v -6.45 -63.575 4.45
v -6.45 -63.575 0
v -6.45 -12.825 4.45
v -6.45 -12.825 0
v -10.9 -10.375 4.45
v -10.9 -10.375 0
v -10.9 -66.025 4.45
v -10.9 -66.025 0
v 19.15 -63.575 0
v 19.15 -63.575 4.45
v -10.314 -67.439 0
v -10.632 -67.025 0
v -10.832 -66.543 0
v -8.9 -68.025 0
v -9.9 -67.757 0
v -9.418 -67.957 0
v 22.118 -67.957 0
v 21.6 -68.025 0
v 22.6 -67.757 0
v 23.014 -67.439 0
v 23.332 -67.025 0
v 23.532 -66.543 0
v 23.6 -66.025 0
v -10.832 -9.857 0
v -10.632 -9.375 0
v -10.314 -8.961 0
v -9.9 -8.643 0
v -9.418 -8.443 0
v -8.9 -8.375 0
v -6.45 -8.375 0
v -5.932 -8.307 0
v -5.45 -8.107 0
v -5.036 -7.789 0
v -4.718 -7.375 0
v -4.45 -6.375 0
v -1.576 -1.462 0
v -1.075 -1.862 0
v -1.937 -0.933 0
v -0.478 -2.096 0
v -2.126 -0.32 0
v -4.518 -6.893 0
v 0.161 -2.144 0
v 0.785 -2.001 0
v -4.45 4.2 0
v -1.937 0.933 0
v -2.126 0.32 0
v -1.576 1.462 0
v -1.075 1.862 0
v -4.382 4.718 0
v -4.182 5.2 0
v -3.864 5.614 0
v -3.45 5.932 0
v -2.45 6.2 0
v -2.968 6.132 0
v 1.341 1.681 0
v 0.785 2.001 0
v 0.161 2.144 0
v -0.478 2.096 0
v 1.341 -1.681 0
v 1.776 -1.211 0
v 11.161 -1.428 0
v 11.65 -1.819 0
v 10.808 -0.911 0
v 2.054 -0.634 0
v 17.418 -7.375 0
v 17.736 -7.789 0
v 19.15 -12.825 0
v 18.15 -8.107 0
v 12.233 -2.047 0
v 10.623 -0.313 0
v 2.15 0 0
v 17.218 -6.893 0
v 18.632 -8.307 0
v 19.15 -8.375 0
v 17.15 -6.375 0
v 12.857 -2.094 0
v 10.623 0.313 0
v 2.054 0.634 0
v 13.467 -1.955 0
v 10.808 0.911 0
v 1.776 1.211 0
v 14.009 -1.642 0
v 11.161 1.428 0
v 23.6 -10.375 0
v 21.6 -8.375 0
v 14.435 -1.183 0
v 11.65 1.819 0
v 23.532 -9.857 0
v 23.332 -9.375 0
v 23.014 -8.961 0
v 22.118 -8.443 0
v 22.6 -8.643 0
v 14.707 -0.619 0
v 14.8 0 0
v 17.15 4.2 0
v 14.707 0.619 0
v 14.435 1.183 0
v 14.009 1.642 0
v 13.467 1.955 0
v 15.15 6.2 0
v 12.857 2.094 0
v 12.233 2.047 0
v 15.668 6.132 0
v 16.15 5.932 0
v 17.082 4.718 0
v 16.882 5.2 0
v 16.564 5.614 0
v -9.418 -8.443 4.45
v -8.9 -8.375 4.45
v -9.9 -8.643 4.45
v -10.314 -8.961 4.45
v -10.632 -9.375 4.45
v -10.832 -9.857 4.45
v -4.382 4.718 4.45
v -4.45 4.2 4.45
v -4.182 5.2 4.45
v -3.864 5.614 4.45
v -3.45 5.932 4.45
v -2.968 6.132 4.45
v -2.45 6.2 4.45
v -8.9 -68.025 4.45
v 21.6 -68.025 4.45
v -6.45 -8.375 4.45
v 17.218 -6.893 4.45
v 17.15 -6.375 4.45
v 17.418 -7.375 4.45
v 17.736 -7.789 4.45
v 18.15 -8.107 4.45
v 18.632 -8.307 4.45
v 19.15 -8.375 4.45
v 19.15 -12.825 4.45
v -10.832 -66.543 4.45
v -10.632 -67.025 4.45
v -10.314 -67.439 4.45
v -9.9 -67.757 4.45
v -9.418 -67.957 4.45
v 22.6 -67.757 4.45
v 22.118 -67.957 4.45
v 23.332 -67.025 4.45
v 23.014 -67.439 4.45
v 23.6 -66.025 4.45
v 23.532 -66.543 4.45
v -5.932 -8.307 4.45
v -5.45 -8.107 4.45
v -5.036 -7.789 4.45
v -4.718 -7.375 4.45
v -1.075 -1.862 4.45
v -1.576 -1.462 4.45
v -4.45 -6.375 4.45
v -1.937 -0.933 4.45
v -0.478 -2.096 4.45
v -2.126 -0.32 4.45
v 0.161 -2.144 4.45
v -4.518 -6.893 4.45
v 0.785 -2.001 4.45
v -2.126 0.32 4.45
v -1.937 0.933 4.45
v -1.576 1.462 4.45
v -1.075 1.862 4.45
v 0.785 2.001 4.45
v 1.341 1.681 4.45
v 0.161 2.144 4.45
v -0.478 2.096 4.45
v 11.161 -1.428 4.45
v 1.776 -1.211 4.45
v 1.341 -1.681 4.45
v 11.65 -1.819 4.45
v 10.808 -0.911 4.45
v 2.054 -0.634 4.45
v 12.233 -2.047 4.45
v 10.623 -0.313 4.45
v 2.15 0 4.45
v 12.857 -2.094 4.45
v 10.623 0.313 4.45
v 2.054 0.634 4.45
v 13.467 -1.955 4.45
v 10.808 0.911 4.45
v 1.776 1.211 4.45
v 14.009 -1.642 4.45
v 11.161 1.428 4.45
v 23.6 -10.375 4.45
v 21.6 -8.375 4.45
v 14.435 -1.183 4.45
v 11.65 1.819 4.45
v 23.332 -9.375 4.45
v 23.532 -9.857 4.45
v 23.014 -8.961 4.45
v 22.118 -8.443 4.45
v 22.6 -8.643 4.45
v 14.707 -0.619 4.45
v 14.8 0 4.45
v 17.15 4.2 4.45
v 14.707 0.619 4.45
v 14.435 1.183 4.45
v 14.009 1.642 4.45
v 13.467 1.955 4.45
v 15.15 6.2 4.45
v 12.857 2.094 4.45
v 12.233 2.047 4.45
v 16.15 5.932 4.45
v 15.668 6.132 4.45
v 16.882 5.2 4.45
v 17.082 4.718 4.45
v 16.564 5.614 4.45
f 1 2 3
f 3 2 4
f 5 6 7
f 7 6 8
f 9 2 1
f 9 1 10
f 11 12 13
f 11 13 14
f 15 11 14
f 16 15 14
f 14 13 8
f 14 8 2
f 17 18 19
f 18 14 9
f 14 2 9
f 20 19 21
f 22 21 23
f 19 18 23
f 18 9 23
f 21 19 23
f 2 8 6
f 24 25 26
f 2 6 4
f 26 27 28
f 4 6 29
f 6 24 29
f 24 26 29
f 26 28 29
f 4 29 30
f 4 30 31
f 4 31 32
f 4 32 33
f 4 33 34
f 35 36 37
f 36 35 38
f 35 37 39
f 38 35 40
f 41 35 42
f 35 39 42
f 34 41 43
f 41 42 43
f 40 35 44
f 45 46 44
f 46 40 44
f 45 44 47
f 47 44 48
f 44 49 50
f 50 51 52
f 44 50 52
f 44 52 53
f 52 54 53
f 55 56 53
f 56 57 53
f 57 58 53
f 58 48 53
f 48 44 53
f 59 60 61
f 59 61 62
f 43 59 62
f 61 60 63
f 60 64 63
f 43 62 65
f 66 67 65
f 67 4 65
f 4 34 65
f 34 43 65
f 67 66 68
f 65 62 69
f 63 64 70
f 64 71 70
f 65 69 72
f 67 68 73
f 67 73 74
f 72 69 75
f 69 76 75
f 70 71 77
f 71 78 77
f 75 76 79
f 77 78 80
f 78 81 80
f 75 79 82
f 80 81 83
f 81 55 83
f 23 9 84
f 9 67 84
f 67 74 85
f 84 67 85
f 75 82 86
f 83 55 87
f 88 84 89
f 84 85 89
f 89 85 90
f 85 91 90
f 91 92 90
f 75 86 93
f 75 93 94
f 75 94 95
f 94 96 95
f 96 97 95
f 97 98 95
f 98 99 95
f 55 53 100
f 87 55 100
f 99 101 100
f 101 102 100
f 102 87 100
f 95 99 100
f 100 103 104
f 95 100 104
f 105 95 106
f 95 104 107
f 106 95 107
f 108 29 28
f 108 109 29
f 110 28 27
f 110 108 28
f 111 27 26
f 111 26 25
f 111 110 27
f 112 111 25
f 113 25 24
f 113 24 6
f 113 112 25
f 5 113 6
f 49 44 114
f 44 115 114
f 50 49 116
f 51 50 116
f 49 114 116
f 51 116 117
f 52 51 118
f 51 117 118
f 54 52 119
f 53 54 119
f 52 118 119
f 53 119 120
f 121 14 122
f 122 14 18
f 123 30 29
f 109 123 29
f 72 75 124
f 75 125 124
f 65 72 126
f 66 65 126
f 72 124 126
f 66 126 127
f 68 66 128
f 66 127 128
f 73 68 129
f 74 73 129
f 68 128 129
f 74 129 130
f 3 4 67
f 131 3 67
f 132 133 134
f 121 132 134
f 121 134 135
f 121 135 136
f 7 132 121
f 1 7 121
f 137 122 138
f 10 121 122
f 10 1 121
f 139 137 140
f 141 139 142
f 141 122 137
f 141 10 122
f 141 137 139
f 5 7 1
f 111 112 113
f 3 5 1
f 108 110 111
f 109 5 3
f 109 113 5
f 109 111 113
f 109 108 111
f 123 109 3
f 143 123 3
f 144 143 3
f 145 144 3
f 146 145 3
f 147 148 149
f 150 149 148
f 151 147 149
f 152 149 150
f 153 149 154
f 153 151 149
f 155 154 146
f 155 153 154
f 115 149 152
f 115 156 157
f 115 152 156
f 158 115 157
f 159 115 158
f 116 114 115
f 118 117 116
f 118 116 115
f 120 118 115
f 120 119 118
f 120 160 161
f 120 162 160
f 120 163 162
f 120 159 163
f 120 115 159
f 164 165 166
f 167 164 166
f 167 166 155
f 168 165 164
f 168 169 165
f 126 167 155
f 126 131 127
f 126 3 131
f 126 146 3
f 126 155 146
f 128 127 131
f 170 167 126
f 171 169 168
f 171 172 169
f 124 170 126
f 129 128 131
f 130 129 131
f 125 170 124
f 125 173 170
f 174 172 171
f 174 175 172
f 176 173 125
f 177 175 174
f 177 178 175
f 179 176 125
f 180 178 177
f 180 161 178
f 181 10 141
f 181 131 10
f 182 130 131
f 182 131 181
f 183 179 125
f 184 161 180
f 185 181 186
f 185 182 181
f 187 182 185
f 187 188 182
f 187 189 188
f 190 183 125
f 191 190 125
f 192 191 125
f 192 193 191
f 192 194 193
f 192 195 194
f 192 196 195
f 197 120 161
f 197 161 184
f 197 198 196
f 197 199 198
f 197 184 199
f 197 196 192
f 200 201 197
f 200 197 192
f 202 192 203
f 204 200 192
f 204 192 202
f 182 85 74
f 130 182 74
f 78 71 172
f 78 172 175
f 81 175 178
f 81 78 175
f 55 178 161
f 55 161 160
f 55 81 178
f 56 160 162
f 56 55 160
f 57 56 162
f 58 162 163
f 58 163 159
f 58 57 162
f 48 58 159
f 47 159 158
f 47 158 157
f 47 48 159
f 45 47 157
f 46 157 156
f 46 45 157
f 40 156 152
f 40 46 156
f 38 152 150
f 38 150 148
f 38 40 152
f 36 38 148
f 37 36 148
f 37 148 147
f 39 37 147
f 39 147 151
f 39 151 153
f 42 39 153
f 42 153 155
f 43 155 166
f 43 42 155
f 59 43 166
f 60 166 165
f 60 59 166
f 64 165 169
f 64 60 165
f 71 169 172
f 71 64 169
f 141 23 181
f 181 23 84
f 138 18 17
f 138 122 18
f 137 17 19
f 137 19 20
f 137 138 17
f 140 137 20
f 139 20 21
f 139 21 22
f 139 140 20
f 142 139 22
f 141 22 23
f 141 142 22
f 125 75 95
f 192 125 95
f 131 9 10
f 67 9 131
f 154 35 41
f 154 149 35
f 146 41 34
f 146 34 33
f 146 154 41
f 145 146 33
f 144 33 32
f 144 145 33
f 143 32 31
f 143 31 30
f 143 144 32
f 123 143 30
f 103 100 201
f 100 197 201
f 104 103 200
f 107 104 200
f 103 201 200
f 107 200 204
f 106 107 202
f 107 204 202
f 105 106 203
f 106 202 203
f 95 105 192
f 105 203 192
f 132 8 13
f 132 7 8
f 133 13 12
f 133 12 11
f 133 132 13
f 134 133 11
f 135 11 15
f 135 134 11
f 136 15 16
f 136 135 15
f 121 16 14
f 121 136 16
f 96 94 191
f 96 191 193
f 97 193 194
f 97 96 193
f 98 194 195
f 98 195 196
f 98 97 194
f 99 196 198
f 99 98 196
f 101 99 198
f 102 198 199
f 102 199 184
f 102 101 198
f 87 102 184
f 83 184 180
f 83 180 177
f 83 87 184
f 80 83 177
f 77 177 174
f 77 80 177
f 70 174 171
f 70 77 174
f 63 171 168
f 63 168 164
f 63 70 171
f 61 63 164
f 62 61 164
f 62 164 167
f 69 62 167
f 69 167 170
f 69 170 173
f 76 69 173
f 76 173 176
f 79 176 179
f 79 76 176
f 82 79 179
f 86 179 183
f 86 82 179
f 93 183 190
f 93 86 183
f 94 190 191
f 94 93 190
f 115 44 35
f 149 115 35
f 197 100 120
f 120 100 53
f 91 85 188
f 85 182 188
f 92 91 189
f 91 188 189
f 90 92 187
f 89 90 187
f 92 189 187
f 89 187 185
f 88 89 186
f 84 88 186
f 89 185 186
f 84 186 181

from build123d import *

# Parameters (mm, degrees)
SKETCH3_W           = 25.6
SKETCH3_H           = 50.75
SKETCH3_R           = 2.15
SKETCH3_R_2         = 2.1
BOSS_EXTRUDE1_DEPTH = 4.45
FILLET1_R           = 2


with BuildPart() as part:
    # Sketch3 → Boss-Extrude1 (new body)
    with BuildSketch(Plane.XY):
        Polygon((-4.45, -8.375), (-10.9, -8.375), (-10.9, -68.025), (23.6, -68.025), (23.6, -8.375), (17.15, -8.375), (17.15, 6.2), (-4.45, 6.2), align=None)
        with Locations((6.35, -38.2)):
            Rectangle(SKETCH3_W, SKETCH3_H, mode=Mode.SUBTRACT)
        Circle(SKETCH3_R, mode=Mode.SUBTRACT)
        with Locations((12.7, 0)):
            Circle(SKETCH3_R_2, mode=Mode.SUBTRACT)
    extrude(amount=BOSS_EXTRUDE1_DEPTH)

    # Fillet1
    fillet1_edges = [part.edges().sort_by_distance(p)[0] for p in [
        (-10.9, -68.025, 2.225),
        (23.6, -68.025, 2.225),
        (-10.9, -8.375, 2.225),
        (23.6, -8.375, 2.225),
        (17.15, -8.375, 2.225),
        (17.15, 6.2, 2.225),
        (-4.45, 6.2, 2.225),
        (-4.45, -8.375, 2.225),
    ]]
    fillet(fillet1_edges, radius=FILLET1_R)


solid = part.part
